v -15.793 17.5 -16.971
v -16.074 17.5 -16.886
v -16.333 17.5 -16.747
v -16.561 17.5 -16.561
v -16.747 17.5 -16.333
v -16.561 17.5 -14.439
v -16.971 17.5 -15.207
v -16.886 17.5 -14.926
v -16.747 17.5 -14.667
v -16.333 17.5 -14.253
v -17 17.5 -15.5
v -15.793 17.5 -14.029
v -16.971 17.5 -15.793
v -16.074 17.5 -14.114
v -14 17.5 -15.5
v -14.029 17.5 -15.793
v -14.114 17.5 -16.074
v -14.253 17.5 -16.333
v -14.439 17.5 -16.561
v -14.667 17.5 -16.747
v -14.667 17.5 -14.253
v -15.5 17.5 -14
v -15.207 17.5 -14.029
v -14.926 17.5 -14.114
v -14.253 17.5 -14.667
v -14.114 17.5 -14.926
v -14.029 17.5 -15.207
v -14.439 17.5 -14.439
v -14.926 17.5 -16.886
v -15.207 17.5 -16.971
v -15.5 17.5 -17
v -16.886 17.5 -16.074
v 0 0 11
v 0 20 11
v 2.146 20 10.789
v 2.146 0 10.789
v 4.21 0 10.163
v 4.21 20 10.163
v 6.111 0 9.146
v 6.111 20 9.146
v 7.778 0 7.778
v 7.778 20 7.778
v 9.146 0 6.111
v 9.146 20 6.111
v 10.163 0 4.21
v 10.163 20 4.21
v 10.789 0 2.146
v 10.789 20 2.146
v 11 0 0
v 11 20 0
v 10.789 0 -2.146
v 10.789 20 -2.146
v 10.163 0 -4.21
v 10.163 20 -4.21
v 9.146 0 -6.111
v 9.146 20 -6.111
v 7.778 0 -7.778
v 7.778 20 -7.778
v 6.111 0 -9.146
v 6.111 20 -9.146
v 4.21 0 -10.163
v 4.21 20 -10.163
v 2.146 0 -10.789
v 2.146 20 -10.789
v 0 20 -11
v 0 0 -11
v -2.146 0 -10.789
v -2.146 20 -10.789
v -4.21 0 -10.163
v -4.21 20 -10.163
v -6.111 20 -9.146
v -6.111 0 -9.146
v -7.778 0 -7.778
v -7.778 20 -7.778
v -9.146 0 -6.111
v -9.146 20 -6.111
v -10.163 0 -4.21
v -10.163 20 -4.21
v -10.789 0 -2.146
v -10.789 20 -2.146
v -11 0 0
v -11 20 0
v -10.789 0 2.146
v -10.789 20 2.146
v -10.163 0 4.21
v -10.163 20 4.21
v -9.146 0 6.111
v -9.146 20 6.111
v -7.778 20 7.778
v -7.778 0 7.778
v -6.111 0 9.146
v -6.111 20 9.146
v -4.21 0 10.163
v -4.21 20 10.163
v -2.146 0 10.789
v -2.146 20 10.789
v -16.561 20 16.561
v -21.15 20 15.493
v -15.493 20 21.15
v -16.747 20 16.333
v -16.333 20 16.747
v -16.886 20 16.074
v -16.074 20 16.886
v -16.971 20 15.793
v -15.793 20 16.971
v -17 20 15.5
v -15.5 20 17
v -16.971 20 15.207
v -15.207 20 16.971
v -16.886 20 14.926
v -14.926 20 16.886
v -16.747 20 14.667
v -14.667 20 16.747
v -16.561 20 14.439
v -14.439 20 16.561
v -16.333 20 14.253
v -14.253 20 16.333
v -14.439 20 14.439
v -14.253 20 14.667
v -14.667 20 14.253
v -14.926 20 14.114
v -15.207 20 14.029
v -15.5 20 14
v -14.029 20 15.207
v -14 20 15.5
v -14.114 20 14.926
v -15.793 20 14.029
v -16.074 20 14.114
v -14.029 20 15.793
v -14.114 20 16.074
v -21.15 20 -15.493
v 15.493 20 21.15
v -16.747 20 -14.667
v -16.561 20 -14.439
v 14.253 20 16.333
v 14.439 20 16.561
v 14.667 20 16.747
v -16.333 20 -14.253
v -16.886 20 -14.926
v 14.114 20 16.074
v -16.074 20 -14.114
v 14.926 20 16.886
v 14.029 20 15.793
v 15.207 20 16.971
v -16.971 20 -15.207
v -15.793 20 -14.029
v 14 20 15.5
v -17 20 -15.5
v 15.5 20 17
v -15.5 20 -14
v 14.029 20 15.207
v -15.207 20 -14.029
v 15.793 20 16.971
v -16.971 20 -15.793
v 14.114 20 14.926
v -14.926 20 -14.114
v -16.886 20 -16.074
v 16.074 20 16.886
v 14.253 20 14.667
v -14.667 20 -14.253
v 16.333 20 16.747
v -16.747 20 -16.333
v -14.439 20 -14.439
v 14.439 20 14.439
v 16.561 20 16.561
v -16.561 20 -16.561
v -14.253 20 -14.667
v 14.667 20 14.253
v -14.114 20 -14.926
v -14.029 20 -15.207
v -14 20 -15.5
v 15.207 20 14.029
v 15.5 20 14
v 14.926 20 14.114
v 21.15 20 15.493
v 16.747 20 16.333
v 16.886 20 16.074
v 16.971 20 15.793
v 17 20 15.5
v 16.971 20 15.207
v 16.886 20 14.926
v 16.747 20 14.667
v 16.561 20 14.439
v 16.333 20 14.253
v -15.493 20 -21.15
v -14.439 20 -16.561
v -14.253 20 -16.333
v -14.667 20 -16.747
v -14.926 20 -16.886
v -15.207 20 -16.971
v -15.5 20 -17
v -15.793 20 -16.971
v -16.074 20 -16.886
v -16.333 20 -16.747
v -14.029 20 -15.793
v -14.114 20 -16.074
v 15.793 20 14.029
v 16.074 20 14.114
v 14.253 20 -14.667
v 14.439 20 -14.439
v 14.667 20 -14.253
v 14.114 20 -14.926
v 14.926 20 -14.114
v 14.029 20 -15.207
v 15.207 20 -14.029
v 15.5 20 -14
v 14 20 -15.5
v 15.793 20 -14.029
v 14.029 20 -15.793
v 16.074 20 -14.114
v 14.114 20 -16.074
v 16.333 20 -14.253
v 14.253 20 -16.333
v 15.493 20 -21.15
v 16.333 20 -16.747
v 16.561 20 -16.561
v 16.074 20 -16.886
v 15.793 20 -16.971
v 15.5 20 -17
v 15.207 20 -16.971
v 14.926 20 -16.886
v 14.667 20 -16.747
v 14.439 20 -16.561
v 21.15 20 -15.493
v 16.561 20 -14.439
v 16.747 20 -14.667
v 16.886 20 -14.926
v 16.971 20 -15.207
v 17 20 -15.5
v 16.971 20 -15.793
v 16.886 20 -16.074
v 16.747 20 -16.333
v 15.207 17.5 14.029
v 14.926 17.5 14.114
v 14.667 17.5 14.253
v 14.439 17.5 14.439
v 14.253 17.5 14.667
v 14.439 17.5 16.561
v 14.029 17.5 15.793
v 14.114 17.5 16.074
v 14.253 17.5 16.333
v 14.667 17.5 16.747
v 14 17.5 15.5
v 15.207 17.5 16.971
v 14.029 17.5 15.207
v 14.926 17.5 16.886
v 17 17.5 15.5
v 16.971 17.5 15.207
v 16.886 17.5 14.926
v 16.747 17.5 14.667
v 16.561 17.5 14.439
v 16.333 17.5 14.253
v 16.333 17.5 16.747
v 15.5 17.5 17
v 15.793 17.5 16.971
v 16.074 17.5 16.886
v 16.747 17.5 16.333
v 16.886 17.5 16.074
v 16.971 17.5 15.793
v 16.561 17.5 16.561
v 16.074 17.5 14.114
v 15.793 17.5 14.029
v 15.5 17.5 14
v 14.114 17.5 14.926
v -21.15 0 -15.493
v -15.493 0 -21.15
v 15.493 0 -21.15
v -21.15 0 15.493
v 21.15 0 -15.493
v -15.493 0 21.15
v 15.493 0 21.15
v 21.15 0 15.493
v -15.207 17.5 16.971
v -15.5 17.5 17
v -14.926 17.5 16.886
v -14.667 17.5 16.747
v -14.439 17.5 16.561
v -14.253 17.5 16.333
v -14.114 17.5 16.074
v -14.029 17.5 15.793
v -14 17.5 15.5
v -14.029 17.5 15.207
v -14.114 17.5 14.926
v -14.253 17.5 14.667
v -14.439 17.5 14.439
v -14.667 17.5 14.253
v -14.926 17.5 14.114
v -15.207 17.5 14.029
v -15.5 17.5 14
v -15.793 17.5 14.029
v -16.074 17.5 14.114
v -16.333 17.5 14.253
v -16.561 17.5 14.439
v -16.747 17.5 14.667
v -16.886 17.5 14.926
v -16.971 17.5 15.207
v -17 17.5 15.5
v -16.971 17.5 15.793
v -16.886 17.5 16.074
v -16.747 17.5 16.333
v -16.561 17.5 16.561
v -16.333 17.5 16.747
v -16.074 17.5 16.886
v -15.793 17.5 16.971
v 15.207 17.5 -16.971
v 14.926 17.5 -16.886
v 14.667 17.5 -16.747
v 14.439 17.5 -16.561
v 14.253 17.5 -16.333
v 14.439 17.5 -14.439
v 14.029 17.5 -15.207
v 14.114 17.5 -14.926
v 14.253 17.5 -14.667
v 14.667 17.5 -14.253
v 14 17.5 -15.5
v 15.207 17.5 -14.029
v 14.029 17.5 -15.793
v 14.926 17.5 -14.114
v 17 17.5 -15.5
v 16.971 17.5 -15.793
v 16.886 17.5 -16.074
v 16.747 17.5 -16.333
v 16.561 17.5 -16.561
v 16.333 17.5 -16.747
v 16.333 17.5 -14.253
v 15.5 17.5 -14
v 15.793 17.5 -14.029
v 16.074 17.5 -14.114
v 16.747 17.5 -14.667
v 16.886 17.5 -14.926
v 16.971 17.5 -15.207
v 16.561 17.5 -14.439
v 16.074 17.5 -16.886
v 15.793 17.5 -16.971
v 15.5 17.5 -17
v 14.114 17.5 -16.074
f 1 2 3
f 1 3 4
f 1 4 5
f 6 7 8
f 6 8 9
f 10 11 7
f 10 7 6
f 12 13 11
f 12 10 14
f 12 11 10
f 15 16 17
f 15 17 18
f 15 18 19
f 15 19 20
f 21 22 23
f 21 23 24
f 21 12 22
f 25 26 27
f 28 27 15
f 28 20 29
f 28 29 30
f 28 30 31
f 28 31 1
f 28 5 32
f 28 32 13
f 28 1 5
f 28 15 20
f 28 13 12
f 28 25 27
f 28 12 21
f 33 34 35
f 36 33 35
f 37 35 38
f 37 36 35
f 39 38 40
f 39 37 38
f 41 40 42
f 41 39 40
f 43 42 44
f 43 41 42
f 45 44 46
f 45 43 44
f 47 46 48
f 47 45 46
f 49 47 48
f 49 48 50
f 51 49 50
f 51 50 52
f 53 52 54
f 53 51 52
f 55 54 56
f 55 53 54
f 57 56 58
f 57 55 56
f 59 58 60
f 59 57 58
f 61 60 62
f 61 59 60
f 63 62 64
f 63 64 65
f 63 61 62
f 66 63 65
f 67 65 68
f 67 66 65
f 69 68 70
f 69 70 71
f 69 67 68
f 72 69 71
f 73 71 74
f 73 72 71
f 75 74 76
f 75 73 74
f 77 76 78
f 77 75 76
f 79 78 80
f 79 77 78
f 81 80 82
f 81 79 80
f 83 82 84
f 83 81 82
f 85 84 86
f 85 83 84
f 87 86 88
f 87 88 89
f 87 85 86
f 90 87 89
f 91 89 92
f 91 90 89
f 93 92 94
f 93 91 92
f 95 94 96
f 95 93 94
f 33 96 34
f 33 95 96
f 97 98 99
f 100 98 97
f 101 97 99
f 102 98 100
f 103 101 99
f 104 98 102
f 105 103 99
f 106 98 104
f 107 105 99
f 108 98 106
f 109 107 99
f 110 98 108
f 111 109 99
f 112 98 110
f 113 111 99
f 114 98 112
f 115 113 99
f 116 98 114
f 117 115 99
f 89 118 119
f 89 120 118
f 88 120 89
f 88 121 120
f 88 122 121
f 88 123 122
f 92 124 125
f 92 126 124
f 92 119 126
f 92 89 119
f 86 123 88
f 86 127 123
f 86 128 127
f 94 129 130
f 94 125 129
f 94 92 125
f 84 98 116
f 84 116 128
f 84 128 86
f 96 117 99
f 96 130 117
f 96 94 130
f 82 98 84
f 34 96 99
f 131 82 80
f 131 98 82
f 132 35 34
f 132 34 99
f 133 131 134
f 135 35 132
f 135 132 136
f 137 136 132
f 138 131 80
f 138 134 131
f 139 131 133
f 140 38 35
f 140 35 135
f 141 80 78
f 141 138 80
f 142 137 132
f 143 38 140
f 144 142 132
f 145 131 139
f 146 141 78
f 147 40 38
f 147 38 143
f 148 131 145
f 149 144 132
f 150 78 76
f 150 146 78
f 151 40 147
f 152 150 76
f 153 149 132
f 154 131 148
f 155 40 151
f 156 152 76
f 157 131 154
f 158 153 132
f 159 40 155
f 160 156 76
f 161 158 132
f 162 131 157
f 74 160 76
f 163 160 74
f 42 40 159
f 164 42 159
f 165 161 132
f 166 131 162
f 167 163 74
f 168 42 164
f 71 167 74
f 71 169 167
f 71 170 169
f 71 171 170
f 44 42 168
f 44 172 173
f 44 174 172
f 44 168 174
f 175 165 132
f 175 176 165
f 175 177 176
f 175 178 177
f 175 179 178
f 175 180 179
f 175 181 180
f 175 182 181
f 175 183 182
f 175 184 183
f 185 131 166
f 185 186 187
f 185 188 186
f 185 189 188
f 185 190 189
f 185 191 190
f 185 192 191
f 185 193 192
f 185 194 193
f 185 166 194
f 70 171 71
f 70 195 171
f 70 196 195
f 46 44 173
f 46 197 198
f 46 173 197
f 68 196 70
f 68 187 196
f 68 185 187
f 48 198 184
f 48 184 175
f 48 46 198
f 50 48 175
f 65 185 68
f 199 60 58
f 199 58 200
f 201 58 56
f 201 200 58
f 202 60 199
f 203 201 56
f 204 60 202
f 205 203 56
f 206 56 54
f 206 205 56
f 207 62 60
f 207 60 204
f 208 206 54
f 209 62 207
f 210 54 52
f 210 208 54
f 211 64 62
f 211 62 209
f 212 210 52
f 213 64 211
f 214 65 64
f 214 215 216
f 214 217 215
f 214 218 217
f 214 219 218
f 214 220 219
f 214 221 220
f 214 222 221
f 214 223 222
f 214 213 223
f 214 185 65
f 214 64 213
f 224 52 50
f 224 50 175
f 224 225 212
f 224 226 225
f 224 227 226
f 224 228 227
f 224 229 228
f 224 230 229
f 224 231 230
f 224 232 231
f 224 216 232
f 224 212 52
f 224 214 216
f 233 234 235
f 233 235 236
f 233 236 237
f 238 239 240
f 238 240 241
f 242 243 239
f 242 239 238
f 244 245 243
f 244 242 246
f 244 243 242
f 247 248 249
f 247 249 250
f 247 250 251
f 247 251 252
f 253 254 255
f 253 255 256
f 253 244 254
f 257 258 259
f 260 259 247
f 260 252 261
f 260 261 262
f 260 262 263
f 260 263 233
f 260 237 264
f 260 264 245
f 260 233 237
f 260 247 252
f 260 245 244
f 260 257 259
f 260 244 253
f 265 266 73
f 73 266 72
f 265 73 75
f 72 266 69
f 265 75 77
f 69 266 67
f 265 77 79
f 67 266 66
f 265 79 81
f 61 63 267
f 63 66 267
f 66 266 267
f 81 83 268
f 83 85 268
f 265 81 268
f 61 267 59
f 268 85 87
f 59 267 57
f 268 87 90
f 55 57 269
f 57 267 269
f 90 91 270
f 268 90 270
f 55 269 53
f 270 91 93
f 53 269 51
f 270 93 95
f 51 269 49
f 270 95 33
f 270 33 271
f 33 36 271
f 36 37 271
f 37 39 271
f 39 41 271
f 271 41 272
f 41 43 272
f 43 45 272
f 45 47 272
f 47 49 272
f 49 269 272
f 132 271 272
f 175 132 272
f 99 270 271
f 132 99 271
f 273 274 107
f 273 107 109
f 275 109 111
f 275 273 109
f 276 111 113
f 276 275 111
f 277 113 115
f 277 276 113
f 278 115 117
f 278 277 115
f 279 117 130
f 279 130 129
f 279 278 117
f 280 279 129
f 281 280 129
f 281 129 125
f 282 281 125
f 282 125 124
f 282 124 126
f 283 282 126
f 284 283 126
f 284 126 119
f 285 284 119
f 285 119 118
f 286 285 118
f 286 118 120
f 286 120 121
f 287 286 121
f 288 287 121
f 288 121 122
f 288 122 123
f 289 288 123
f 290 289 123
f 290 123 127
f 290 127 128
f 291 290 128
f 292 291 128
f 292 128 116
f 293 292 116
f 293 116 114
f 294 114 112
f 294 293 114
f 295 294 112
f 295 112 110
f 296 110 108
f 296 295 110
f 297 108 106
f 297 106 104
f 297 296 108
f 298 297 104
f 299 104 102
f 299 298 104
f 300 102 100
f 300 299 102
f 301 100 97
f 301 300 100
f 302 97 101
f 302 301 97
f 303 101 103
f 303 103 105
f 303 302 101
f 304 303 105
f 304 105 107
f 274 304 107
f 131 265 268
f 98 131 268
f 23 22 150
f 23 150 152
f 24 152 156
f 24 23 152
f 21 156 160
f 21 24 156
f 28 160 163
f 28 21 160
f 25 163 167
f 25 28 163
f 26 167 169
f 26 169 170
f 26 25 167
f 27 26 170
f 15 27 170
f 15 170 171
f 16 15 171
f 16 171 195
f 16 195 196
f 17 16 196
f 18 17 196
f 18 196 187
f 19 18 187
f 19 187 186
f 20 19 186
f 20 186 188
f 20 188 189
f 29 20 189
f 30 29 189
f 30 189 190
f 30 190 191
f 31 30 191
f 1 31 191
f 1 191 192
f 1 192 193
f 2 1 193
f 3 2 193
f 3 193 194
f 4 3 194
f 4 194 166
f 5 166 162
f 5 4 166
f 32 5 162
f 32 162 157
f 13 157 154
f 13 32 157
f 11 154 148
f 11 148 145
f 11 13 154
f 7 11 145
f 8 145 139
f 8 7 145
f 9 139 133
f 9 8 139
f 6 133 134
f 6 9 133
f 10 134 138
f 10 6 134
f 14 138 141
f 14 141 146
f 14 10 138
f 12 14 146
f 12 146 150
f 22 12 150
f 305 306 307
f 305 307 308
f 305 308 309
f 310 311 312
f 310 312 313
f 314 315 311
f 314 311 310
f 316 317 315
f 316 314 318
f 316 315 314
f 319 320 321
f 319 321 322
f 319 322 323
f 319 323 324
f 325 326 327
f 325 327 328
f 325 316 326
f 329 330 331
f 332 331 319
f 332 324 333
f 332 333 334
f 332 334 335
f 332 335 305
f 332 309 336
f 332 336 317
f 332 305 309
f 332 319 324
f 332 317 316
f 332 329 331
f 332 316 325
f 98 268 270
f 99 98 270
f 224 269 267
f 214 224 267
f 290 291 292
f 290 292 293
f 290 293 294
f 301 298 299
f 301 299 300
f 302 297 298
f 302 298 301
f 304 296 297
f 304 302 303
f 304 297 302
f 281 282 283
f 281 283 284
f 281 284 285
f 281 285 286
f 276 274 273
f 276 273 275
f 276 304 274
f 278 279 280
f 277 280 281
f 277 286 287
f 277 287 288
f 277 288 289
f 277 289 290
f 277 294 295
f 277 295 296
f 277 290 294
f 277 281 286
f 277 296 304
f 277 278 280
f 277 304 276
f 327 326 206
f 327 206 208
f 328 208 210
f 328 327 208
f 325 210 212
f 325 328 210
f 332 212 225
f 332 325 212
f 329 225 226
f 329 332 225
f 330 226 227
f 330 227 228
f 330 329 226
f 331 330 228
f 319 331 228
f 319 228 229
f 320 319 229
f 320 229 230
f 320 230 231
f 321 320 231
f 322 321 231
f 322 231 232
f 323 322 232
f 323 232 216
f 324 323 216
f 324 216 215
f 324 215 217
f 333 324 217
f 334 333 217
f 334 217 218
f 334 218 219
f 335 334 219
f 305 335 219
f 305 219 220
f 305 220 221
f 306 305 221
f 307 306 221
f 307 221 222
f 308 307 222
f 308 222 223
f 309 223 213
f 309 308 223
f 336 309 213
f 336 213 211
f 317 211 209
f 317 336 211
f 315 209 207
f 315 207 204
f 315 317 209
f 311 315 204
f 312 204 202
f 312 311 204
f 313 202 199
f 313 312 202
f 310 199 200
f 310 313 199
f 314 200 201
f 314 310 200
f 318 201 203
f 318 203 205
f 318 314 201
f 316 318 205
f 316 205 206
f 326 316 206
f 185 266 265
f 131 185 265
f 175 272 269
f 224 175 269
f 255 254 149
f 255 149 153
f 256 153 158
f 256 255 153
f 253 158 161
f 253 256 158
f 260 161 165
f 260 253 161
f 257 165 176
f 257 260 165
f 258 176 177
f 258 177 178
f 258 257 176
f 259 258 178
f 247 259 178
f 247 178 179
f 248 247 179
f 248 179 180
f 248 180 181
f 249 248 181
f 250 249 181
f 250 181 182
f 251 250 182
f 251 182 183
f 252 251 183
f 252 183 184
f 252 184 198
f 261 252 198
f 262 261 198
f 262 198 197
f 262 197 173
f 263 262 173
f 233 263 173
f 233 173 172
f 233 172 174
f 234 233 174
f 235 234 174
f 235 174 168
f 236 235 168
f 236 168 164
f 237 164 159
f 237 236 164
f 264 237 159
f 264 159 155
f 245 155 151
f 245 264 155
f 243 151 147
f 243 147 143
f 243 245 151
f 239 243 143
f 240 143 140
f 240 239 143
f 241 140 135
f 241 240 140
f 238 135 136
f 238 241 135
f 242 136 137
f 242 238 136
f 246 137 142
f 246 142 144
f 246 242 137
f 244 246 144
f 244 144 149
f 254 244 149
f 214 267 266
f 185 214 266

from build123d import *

# Parameters (mm, degrees)
SKETCH1_R           = 1.5
SKETCH1_R_2         = 11
BOSS_EXTRUDE1_DEPTH = 20
SKETCH1_3_R         = 1.5
BOSS_EXTRUDE2_DEPTH = 17.5


with BuildPart() as part:
    # Sketch1 → Boss-Extrude1 (new body)
    with BuildSketch(Plane(origin=(0, 0, 0), x_dir=(1, 0, 0), z_dir=(0, 1, 0))):
        Polygon((-15.493145751, 21.15), (-21.15, 15.493145751), (-21.15, -15.493145751), (-15.493145751, -21.15), (15.493145751, -21.15), (21.15, -15.493145751), (21.15, 15.493145751), (15.493145751, 21.15), (12, 21.15), (-12, 21.15), align=None)
        with Locations(Location((-15.5, -15.5, 0), (0, 0, 270))):
            Circle(SKETCH1_R, mode=Mode.SUBTRACT)
        with Locations(Location((15.5, -15.5, 0), (0, 0, 270))):
            Circle(SKETCH1_R, mode=Mode.SUBTRACT)
        with Locations(Location((0, 0, 0), (0, 0, 270))):
            Circle(SKETCH1_R_2, mode=Mode.SUBTRACT)
        with Locations(Location((-15.5, 15.5, 0), (0, 0, 270))):
            Circle(SKETCH1_R, mode=Mode.SUBTRACT)
        with Locations(Location((15.5, 15.5, 0), (0, 0, 270))):
            Circle(SKETCH1_R, mode=Mode.SUBTRACT)
    extrude(amount=BOSS_EXTRUDE1_DEPTH)

    # Sketch1<3> → Boss-Extrude2 (add)
    with BuildSketch(Plane(origin=(0, 0, 0), x_dir=(1, 0, 0), z_dir=(0, 1, 0))):
        with Locations(Location((15.5, -15.5, 0), (0, 0, 270))):
            Circle(SKETCH1_3_R)
        with Locations(Location((-15.5, -15.5, 0), (0, 0, 270))):
            Circle(SKETCH1_3_R)
        with Locations(Location((15.5, 15.5, 0), (0, 0, 270))):
            Circle(SKETCH1_3_R)
        with Locations(Location((-15.5, 15.5, 0), (0, 0, 270))):
            Circle(SKETCH1_3_R)
    extrude(amount=BOSS_EXTRUDE2_DEPTH)


solid = part.part
